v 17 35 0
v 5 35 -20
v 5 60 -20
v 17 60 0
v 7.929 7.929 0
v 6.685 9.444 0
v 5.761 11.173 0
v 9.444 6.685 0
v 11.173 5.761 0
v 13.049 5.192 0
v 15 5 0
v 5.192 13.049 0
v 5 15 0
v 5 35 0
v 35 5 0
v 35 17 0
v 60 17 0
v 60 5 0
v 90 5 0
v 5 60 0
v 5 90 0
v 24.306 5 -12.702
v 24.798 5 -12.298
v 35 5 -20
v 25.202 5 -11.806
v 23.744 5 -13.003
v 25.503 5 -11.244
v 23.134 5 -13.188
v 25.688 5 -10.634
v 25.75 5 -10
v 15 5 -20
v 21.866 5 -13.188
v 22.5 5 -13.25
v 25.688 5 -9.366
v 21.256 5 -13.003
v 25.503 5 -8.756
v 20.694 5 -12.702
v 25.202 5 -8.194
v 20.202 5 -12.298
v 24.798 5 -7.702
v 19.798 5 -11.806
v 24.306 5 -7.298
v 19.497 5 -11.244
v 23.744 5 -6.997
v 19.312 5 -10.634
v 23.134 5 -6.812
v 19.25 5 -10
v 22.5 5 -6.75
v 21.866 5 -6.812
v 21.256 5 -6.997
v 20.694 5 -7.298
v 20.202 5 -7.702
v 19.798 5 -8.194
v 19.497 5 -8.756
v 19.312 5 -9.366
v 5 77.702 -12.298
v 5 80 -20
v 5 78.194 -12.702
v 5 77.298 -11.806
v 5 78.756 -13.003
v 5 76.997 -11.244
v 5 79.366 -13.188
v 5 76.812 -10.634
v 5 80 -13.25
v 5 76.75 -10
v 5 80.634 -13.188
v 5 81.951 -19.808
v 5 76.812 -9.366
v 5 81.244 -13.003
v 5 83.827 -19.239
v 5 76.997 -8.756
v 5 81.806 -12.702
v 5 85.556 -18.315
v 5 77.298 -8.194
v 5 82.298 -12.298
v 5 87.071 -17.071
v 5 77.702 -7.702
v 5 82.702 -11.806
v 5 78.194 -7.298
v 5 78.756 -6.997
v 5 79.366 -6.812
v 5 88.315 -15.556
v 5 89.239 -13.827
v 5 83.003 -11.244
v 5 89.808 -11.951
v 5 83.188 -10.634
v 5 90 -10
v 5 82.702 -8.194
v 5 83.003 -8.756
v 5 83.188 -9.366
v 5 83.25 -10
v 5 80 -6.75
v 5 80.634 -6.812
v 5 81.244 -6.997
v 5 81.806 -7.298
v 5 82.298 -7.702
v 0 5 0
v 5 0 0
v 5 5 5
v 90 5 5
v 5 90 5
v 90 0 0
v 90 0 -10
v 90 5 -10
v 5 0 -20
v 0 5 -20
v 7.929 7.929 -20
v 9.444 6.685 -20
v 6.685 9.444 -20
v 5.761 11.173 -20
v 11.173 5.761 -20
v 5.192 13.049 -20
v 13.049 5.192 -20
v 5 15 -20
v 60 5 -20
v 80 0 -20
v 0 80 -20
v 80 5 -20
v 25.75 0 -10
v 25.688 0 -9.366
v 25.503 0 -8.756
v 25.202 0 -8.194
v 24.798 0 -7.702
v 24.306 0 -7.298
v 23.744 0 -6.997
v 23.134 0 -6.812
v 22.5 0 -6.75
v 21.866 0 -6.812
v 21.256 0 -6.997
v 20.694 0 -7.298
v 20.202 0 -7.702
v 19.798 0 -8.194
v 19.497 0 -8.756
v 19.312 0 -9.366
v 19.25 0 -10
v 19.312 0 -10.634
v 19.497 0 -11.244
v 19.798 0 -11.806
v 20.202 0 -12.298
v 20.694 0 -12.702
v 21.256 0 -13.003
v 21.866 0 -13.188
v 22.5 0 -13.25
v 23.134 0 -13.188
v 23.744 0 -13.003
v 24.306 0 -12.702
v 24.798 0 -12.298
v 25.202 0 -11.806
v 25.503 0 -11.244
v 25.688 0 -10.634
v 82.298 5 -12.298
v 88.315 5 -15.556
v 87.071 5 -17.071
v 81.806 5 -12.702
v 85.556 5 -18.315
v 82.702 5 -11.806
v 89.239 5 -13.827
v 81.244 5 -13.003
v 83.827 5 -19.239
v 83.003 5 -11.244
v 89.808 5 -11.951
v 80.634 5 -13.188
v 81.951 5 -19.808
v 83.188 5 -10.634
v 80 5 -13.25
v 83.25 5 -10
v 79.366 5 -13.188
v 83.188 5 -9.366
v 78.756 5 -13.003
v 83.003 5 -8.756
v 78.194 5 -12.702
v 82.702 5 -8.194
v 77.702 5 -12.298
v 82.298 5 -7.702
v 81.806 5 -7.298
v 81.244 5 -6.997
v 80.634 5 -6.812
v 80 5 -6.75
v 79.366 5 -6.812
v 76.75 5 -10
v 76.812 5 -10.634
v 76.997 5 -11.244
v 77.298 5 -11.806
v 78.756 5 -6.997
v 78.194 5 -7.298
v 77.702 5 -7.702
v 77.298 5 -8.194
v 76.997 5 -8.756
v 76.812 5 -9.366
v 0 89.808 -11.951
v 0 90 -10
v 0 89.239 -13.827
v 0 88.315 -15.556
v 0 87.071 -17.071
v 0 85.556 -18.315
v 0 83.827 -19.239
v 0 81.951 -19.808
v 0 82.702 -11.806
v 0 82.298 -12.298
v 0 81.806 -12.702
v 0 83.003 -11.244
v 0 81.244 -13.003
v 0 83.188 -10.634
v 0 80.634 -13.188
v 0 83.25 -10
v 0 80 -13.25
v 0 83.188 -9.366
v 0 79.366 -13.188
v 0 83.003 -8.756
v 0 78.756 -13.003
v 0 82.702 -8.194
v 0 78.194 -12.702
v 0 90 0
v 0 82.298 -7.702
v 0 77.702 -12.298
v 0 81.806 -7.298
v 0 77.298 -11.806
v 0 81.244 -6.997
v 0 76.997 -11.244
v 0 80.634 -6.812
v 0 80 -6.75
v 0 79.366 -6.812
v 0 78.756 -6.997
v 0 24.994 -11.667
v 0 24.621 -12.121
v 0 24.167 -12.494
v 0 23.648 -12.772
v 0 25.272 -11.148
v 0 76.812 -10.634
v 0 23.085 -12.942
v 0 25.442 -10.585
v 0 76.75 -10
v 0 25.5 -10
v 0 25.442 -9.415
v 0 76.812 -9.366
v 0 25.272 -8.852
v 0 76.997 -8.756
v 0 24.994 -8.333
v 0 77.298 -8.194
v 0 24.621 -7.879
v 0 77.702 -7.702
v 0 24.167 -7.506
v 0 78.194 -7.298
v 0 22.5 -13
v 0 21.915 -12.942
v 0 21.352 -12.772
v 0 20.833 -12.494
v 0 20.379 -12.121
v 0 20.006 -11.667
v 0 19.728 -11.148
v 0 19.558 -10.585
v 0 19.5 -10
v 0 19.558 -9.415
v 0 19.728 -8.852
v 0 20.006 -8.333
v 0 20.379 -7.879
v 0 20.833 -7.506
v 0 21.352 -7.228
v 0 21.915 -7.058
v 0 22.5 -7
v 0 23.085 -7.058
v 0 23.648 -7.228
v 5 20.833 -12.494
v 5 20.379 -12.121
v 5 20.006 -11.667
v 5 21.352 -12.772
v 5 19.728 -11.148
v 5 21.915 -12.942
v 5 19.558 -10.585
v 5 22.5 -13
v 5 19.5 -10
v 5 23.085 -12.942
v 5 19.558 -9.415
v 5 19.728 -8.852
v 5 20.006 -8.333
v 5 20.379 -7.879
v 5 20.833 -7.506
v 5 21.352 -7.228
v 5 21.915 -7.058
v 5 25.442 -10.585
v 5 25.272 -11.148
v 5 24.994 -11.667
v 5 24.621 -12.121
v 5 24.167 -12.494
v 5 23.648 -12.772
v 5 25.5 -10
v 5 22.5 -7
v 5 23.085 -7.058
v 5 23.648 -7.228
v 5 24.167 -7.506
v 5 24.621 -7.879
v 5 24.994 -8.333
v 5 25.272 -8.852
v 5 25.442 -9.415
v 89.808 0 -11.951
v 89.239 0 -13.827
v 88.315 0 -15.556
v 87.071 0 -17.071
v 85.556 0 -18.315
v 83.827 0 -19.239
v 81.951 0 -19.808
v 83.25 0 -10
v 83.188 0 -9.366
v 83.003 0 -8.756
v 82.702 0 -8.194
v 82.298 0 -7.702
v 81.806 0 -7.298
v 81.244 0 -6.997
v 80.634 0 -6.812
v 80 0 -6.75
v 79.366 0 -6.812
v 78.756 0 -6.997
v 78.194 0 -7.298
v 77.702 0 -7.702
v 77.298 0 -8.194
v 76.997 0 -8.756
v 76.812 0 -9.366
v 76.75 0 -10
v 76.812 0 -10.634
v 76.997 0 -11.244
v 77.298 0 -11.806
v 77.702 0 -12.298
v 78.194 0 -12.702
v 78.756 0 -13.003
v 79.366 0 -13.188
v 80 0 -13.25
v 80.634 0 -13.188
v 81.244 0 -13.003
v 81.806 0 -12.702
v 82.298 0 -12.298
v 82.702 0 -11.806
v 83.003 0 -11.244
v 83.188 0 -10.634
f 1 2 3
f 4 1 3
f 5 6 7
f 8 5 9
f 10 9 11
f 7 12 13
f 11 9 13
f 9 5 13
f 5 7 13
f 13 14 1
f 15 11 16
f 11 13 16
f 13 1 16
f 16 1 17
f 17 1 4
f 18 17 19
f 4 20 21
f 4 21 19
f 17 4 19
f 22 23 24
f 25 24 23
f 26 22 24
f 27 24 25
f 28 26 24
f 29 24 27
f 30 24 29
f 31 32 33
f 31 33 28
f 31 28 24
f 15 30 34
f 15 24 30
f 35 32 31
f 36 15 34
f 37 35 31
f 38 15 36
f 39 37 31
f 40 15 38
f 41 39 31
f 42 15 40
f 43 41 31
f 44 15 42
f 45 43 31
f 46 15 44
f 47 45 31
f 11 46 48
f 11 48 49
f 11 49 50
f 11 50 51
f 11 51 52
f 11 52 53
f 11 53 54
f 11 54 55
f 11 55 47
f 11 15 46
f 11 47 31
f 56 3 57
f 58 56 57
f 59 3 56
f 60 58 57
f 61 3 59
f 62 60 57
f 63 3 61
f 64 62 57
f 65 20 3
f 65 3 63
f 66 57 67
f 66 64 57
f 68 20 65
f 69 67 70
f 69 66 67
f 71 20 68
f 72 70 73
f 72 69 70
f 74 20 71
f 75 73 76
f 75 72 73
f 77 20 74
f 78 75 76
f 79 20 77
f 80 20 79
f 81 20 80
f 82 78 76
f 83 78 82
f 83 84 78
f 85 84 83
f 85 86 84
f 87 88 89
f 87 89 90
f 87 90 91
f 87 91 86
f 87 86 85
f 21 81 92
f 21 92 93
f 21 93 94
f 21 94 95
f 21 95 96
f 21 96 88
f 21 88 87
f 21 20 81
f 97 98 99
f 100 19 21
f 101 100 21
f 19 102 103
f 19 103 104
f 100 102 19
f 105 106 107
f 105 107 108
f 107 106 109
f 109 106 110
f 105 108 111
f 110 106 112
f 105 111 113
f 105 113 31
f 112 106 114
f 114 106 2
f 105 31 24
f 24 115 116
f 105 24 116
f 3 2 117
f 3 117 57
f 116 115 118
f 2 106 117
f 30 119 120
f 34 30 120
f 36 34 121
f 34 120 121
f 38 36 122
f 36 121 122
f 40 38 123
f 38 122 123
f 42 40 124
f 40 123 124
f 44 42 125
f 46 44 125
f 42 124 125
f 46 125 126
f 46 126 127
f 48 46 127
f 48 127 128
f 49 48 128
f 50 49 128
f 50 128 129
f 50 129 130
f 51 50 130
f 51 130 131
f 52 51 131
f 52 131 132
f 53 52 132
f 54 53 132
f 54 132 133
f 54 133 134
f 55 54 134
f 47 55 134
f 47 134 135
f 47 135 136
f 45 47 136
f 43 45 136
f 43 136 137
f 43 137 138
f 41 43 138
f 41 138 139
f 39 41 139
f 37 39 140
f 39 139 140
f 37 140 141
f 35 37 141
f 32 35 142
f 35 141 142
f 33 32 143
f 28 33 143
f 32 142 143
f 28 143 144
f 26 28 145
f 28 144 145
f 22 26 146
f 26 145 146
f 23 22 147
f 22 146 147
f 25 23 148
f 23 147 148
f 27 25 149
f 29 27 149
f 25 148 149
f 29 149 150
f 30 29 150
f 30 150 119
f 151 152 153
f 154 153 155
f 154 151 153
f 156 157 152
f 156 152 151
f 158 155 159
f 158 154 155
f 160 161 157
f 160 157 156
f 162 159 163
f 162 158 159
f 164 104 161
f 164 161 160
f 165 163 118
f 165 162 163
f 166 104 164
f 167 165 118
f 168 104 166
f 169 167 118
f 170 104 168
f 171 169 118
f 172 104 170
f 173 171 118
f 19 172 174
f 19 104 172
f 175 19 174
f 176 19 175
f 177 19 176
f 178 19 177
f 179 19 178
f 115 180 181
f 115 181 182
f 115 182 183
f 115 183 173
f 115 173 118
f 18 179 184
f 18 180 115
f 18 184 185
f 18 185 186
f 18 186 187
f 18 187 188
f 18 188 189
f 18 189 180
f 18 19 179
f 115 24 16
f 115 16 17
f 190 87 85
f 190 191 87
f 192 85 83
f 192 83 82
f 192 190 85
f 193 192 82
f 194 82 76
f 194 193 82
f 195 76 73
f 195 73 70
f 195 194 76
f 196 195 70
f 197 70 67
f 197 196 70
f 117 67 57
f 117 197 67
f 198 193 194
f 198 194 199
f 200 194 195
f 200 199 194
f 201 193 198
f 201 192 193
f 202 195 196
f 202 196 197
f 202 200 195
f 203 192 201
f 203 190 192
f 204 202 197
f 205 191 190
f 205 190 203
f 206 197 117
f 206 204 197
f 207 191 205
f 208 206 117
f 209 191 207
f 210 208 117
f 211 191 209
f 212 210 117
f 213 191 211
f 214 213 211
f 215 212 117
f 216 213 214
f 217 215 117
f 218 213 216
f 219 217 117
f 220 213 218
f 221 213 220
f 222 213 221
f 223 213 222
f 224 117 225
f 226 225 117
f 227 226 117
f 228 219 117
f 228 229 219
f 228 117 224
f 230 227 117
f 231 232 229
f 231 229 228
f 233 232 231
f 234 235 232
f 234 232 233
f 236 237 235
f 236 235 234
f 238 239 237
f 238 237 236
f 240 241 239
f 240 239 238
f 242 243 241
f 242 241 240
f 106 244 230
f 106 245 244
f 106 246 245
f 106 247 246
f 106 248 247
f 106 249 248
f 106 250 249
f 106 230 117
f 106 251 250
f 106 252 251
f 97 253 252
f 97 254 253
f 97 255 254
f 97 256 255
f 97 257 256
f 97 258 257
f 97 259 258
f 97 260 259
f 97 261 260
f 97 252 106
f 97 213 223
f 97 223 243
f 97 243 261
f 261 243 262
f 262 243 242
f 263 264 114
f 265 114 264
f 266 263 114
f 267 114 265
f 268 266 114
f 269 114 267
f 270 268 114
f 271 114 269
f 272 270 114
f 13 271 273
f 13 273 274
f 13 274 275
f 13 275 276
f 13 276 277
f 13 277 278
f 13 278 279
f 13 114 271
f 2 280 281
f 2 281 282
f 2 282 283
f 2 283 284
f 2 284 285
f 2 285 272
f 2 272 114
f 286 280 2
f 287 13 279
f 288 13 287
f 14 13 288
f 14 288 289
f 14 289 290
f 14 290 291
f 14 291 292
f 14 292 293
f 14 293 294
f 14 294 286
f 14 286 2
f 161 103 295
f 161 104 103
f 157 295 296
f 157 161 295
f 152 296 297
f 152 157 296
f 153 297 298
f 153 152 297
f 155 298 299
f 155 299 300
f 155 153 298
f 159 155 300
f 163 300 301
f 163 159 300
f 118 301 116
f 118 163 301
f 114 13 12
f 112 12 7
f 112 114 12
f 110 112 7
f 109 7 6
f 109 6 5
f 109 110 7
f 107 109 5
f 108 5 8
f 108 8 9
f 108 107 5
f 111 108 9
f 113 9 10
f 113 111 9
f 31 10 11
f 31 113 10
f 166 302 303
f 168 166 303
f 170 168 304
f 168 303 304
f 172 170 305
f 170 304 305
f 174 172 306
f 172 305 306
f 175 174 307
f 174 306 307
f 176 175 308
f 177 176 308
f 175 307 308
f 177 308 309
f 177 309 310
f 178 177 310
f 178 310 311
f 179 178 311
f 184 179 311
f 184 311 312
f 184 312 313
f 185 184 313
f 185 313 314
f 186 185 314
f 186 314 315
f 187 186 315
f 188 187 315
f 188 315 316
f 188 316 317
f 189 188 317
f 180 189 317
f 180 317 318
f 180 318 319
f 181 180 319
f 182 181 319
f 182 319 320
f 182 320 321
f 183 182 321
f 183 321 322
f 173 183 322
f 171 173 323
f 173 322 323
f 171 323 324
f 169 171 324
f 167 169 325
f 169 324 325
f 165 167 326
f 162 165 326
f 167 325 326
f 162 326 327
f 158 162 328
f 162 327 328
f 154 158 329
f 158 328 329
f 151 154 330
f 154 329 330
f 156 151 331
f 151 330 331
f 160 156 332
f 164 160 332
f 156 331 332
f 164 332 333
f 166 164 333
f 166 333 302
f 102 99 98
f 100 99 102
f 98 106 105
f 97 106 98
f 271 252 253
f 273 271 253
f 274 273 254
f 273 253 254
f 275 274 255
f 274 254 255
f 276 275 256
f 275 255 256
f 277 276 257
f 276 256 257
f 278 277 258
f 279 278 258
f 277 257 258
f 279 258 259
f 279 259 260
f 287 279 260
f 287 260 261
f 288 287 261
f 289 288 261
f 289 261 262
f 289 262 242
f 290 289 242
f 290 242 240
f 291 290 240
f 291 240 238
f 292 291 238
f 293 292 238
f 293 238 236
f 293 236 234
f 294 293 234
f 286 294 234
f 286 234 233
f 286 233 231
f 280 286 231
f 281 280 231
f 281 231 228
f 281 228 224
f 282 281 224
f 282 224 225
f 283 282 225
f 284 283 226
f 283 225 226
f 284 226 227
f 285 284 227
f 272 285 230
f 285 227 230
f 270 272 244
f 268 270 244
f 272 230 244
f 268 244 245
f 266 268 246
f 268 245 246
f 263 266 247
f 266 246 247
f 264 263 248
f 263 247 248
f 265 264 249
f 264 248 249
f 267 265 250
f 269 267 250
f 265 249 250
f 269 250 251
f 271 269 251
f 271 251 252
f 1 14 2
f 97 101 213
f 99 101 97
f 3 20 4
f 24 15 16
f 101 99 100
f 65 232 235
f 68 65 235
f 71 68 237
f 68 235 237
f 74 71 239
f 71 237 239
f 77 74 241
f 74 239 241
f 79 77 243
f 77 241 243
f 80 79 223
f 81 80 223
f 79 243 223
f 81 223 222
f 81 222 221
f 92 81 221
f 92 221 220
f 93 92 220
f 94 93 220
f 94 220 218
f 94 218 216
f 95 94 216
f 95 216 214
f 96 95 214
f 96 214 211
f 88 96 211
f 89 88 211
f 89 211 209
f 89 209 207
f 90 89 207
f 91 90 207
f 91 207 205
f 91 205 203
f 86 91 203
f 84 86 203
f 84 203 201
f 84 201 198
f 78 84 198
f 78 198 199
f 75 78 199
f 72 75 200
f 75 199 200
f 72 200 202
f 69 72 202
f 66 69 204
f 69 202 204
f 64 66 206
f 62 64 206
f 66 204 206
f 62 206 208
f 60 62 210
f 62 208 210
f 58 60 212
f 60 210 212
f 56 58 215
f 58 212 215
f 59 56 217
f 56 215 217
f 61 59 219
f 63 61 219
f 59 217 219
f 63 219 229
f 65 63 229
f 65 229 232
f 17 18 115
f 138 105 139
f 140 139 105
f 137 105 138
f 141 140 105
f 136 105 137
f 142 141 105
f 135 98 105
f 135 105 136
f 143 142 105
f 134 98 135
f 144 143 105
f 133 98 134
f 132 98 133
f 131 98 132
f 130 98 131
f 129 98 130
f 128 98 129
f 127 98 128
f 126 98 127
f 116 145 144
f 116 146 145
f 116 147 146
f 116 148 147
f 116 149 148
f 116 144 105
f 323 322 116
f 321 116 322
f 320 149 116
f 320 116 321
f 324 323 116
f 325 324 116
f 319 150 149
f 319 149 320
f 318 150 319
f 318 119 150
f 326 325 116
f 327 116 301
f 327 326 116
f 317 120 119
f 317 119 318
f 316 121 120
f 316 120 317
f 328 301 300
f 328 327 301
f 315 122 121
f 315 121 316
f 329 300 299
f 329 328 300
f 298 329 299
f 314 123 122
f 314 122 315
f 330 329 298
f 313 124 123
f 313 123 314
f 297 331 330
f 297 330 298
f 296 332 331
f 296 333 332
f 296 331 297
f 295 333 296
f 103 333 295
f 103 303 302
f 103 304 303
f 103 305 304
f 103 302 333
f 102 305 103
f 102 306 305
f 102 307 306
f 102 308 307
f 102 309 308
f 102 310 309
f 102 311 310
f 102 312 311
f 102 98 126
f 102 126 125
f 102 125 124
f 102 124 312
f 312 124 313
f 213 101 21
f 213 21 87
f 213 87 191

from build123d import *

# Parameters (mm, degrees)
F0_W       = 12
F0_H       = 25
F0_W_2     = 25
F0_H_2     = 12
F1_DEPTH   = 5
F2_DEPTH   = 20
F3_R       = 10
F5_R       = 3.25
F6_DEPTH   = 25
F4_R       = 3
F4_R_2     = 3.25
F7_DEPTH   = 25
F8_SIZE2   = 11.99999
F8_SIZE    = 19.99999
F8_2_SIZE2 = 11.99999
F8_2_SIZE  = 19.99999
F9_SIZE    = 5


# Not quite as in the source:
# - a fillet or chamfer is up to 0.001 mm smaller than in the source, because OpenCascade refuses the exact size


with BuildPart() as f1:
    # F0 (on Top) → F1 (new body)
    with BuildSketch(Plane.XY):
        Polygon((0, 90), (0, 0), (90, 0), (90, 5), (60, 5), (35, 5), (5, 5), (5, 35), (5, 60), (5, 90), align=None)
        Polygon((90, 5), (5, 90), (5, 60), (17, 60), (17, 35), (5, 35), (5, 5), (35, 5), (35, 17), (60, 17), (60, 5), align=None)
        with Locations((11, 47.5)):
            Rectangle(F0_W, F0_H)
        with Locations((47.5, 11)):
            Rectangle(F0_W_2, F0_H_2)
    extrude(amount=F1_DEPTH)

    # F0 (on Top) → F2 (join)
    with BuildSketch(Plane.XY):
        Polygon((0, 90), (0, 0), (90, 0), (90, 5), (60, 5), (35, 5), (5, 5), (5, 35), (5, 60), (5, 90), align=None)
        with Locations((11, 47.5)):
            Rectangle(F0_W, F0_H)
        with Locations((47.5, 11)):
            Rectangle(F0_W_2, F0_H_2)
    extrude(amount=-F2_DEPTH)

    # F3
    f3_edges = [f1.edges().sort_by_distance(p)[0] for p in [
        (5, 5, -10),
        (2.5, 90, -20),
        (90, 2.5, -20),
    ]]
    fillet(f3_edges, radius=F3_R)

    # F5 (on face) → F6 (cut)
    with BuildSketch(Plane.XZ):
        with Locations((22.5, -10)):
            Circle(F5_R)
        with Locations((80, -10)):
            Circle(F5_R)
    extrude(amount=-F6_DEPTH, mode=Mode.SUBTRACT)

    # F4 (on face) → F7 (cut)
    with BuildSketch(Plane(origin=(0, 0, 0), x_dir=(0, -1, 0), z_dir=(-1, 0, 0))):
        with Locations((-22.5, -10)):
            Circle(F4_R)
        with Locations((-80, -10)):
            Circle(F4_R_2)
    extrude(amount=-F7_DEPTH, mode=Mode.SUBTRACT)

    # F8 (size 20 and 12 in the source; OpenCascade refuses exactly that, so slightly less here)
    f8_edges = [f1.edges().sort_by_distance(p)[0] for p in [
        (17, 47.5, -20),
    ]]
    f8_side = f1.faces().sort_by_distance((17, 47.5, -10))[0]
    chamfer(f8_edges, length=F8_SIZE, length2=F8_SIZE2, reference=f8_side)

    # F8#2 (size 20 and 12 in the source; OpenCascade refuses exactly that, so slightly less here)
    f8_2_edges = [f1.edges().sort_by_distance(p)[0] for p in [
        (47.5, 17, -20),
    ]]
    f8_2_side = f1.faces().sort_by_distance((47.5, 17, -10))[0]
    chamfer(f8_2_edges, length=F8_2_SIZE, length2=F8_2_SIZE2, reference=f8_2_side)

    # F9
    f9_edges = [f1.edges().sort_by_distance(p)[0] for p in [
        (0, 0, -7.5),
        (45, 0, 5),
        (0, 45, 5),
    ]]
    chamfer(f9_edges, length=F9_SIZE)


solid = f1.part
